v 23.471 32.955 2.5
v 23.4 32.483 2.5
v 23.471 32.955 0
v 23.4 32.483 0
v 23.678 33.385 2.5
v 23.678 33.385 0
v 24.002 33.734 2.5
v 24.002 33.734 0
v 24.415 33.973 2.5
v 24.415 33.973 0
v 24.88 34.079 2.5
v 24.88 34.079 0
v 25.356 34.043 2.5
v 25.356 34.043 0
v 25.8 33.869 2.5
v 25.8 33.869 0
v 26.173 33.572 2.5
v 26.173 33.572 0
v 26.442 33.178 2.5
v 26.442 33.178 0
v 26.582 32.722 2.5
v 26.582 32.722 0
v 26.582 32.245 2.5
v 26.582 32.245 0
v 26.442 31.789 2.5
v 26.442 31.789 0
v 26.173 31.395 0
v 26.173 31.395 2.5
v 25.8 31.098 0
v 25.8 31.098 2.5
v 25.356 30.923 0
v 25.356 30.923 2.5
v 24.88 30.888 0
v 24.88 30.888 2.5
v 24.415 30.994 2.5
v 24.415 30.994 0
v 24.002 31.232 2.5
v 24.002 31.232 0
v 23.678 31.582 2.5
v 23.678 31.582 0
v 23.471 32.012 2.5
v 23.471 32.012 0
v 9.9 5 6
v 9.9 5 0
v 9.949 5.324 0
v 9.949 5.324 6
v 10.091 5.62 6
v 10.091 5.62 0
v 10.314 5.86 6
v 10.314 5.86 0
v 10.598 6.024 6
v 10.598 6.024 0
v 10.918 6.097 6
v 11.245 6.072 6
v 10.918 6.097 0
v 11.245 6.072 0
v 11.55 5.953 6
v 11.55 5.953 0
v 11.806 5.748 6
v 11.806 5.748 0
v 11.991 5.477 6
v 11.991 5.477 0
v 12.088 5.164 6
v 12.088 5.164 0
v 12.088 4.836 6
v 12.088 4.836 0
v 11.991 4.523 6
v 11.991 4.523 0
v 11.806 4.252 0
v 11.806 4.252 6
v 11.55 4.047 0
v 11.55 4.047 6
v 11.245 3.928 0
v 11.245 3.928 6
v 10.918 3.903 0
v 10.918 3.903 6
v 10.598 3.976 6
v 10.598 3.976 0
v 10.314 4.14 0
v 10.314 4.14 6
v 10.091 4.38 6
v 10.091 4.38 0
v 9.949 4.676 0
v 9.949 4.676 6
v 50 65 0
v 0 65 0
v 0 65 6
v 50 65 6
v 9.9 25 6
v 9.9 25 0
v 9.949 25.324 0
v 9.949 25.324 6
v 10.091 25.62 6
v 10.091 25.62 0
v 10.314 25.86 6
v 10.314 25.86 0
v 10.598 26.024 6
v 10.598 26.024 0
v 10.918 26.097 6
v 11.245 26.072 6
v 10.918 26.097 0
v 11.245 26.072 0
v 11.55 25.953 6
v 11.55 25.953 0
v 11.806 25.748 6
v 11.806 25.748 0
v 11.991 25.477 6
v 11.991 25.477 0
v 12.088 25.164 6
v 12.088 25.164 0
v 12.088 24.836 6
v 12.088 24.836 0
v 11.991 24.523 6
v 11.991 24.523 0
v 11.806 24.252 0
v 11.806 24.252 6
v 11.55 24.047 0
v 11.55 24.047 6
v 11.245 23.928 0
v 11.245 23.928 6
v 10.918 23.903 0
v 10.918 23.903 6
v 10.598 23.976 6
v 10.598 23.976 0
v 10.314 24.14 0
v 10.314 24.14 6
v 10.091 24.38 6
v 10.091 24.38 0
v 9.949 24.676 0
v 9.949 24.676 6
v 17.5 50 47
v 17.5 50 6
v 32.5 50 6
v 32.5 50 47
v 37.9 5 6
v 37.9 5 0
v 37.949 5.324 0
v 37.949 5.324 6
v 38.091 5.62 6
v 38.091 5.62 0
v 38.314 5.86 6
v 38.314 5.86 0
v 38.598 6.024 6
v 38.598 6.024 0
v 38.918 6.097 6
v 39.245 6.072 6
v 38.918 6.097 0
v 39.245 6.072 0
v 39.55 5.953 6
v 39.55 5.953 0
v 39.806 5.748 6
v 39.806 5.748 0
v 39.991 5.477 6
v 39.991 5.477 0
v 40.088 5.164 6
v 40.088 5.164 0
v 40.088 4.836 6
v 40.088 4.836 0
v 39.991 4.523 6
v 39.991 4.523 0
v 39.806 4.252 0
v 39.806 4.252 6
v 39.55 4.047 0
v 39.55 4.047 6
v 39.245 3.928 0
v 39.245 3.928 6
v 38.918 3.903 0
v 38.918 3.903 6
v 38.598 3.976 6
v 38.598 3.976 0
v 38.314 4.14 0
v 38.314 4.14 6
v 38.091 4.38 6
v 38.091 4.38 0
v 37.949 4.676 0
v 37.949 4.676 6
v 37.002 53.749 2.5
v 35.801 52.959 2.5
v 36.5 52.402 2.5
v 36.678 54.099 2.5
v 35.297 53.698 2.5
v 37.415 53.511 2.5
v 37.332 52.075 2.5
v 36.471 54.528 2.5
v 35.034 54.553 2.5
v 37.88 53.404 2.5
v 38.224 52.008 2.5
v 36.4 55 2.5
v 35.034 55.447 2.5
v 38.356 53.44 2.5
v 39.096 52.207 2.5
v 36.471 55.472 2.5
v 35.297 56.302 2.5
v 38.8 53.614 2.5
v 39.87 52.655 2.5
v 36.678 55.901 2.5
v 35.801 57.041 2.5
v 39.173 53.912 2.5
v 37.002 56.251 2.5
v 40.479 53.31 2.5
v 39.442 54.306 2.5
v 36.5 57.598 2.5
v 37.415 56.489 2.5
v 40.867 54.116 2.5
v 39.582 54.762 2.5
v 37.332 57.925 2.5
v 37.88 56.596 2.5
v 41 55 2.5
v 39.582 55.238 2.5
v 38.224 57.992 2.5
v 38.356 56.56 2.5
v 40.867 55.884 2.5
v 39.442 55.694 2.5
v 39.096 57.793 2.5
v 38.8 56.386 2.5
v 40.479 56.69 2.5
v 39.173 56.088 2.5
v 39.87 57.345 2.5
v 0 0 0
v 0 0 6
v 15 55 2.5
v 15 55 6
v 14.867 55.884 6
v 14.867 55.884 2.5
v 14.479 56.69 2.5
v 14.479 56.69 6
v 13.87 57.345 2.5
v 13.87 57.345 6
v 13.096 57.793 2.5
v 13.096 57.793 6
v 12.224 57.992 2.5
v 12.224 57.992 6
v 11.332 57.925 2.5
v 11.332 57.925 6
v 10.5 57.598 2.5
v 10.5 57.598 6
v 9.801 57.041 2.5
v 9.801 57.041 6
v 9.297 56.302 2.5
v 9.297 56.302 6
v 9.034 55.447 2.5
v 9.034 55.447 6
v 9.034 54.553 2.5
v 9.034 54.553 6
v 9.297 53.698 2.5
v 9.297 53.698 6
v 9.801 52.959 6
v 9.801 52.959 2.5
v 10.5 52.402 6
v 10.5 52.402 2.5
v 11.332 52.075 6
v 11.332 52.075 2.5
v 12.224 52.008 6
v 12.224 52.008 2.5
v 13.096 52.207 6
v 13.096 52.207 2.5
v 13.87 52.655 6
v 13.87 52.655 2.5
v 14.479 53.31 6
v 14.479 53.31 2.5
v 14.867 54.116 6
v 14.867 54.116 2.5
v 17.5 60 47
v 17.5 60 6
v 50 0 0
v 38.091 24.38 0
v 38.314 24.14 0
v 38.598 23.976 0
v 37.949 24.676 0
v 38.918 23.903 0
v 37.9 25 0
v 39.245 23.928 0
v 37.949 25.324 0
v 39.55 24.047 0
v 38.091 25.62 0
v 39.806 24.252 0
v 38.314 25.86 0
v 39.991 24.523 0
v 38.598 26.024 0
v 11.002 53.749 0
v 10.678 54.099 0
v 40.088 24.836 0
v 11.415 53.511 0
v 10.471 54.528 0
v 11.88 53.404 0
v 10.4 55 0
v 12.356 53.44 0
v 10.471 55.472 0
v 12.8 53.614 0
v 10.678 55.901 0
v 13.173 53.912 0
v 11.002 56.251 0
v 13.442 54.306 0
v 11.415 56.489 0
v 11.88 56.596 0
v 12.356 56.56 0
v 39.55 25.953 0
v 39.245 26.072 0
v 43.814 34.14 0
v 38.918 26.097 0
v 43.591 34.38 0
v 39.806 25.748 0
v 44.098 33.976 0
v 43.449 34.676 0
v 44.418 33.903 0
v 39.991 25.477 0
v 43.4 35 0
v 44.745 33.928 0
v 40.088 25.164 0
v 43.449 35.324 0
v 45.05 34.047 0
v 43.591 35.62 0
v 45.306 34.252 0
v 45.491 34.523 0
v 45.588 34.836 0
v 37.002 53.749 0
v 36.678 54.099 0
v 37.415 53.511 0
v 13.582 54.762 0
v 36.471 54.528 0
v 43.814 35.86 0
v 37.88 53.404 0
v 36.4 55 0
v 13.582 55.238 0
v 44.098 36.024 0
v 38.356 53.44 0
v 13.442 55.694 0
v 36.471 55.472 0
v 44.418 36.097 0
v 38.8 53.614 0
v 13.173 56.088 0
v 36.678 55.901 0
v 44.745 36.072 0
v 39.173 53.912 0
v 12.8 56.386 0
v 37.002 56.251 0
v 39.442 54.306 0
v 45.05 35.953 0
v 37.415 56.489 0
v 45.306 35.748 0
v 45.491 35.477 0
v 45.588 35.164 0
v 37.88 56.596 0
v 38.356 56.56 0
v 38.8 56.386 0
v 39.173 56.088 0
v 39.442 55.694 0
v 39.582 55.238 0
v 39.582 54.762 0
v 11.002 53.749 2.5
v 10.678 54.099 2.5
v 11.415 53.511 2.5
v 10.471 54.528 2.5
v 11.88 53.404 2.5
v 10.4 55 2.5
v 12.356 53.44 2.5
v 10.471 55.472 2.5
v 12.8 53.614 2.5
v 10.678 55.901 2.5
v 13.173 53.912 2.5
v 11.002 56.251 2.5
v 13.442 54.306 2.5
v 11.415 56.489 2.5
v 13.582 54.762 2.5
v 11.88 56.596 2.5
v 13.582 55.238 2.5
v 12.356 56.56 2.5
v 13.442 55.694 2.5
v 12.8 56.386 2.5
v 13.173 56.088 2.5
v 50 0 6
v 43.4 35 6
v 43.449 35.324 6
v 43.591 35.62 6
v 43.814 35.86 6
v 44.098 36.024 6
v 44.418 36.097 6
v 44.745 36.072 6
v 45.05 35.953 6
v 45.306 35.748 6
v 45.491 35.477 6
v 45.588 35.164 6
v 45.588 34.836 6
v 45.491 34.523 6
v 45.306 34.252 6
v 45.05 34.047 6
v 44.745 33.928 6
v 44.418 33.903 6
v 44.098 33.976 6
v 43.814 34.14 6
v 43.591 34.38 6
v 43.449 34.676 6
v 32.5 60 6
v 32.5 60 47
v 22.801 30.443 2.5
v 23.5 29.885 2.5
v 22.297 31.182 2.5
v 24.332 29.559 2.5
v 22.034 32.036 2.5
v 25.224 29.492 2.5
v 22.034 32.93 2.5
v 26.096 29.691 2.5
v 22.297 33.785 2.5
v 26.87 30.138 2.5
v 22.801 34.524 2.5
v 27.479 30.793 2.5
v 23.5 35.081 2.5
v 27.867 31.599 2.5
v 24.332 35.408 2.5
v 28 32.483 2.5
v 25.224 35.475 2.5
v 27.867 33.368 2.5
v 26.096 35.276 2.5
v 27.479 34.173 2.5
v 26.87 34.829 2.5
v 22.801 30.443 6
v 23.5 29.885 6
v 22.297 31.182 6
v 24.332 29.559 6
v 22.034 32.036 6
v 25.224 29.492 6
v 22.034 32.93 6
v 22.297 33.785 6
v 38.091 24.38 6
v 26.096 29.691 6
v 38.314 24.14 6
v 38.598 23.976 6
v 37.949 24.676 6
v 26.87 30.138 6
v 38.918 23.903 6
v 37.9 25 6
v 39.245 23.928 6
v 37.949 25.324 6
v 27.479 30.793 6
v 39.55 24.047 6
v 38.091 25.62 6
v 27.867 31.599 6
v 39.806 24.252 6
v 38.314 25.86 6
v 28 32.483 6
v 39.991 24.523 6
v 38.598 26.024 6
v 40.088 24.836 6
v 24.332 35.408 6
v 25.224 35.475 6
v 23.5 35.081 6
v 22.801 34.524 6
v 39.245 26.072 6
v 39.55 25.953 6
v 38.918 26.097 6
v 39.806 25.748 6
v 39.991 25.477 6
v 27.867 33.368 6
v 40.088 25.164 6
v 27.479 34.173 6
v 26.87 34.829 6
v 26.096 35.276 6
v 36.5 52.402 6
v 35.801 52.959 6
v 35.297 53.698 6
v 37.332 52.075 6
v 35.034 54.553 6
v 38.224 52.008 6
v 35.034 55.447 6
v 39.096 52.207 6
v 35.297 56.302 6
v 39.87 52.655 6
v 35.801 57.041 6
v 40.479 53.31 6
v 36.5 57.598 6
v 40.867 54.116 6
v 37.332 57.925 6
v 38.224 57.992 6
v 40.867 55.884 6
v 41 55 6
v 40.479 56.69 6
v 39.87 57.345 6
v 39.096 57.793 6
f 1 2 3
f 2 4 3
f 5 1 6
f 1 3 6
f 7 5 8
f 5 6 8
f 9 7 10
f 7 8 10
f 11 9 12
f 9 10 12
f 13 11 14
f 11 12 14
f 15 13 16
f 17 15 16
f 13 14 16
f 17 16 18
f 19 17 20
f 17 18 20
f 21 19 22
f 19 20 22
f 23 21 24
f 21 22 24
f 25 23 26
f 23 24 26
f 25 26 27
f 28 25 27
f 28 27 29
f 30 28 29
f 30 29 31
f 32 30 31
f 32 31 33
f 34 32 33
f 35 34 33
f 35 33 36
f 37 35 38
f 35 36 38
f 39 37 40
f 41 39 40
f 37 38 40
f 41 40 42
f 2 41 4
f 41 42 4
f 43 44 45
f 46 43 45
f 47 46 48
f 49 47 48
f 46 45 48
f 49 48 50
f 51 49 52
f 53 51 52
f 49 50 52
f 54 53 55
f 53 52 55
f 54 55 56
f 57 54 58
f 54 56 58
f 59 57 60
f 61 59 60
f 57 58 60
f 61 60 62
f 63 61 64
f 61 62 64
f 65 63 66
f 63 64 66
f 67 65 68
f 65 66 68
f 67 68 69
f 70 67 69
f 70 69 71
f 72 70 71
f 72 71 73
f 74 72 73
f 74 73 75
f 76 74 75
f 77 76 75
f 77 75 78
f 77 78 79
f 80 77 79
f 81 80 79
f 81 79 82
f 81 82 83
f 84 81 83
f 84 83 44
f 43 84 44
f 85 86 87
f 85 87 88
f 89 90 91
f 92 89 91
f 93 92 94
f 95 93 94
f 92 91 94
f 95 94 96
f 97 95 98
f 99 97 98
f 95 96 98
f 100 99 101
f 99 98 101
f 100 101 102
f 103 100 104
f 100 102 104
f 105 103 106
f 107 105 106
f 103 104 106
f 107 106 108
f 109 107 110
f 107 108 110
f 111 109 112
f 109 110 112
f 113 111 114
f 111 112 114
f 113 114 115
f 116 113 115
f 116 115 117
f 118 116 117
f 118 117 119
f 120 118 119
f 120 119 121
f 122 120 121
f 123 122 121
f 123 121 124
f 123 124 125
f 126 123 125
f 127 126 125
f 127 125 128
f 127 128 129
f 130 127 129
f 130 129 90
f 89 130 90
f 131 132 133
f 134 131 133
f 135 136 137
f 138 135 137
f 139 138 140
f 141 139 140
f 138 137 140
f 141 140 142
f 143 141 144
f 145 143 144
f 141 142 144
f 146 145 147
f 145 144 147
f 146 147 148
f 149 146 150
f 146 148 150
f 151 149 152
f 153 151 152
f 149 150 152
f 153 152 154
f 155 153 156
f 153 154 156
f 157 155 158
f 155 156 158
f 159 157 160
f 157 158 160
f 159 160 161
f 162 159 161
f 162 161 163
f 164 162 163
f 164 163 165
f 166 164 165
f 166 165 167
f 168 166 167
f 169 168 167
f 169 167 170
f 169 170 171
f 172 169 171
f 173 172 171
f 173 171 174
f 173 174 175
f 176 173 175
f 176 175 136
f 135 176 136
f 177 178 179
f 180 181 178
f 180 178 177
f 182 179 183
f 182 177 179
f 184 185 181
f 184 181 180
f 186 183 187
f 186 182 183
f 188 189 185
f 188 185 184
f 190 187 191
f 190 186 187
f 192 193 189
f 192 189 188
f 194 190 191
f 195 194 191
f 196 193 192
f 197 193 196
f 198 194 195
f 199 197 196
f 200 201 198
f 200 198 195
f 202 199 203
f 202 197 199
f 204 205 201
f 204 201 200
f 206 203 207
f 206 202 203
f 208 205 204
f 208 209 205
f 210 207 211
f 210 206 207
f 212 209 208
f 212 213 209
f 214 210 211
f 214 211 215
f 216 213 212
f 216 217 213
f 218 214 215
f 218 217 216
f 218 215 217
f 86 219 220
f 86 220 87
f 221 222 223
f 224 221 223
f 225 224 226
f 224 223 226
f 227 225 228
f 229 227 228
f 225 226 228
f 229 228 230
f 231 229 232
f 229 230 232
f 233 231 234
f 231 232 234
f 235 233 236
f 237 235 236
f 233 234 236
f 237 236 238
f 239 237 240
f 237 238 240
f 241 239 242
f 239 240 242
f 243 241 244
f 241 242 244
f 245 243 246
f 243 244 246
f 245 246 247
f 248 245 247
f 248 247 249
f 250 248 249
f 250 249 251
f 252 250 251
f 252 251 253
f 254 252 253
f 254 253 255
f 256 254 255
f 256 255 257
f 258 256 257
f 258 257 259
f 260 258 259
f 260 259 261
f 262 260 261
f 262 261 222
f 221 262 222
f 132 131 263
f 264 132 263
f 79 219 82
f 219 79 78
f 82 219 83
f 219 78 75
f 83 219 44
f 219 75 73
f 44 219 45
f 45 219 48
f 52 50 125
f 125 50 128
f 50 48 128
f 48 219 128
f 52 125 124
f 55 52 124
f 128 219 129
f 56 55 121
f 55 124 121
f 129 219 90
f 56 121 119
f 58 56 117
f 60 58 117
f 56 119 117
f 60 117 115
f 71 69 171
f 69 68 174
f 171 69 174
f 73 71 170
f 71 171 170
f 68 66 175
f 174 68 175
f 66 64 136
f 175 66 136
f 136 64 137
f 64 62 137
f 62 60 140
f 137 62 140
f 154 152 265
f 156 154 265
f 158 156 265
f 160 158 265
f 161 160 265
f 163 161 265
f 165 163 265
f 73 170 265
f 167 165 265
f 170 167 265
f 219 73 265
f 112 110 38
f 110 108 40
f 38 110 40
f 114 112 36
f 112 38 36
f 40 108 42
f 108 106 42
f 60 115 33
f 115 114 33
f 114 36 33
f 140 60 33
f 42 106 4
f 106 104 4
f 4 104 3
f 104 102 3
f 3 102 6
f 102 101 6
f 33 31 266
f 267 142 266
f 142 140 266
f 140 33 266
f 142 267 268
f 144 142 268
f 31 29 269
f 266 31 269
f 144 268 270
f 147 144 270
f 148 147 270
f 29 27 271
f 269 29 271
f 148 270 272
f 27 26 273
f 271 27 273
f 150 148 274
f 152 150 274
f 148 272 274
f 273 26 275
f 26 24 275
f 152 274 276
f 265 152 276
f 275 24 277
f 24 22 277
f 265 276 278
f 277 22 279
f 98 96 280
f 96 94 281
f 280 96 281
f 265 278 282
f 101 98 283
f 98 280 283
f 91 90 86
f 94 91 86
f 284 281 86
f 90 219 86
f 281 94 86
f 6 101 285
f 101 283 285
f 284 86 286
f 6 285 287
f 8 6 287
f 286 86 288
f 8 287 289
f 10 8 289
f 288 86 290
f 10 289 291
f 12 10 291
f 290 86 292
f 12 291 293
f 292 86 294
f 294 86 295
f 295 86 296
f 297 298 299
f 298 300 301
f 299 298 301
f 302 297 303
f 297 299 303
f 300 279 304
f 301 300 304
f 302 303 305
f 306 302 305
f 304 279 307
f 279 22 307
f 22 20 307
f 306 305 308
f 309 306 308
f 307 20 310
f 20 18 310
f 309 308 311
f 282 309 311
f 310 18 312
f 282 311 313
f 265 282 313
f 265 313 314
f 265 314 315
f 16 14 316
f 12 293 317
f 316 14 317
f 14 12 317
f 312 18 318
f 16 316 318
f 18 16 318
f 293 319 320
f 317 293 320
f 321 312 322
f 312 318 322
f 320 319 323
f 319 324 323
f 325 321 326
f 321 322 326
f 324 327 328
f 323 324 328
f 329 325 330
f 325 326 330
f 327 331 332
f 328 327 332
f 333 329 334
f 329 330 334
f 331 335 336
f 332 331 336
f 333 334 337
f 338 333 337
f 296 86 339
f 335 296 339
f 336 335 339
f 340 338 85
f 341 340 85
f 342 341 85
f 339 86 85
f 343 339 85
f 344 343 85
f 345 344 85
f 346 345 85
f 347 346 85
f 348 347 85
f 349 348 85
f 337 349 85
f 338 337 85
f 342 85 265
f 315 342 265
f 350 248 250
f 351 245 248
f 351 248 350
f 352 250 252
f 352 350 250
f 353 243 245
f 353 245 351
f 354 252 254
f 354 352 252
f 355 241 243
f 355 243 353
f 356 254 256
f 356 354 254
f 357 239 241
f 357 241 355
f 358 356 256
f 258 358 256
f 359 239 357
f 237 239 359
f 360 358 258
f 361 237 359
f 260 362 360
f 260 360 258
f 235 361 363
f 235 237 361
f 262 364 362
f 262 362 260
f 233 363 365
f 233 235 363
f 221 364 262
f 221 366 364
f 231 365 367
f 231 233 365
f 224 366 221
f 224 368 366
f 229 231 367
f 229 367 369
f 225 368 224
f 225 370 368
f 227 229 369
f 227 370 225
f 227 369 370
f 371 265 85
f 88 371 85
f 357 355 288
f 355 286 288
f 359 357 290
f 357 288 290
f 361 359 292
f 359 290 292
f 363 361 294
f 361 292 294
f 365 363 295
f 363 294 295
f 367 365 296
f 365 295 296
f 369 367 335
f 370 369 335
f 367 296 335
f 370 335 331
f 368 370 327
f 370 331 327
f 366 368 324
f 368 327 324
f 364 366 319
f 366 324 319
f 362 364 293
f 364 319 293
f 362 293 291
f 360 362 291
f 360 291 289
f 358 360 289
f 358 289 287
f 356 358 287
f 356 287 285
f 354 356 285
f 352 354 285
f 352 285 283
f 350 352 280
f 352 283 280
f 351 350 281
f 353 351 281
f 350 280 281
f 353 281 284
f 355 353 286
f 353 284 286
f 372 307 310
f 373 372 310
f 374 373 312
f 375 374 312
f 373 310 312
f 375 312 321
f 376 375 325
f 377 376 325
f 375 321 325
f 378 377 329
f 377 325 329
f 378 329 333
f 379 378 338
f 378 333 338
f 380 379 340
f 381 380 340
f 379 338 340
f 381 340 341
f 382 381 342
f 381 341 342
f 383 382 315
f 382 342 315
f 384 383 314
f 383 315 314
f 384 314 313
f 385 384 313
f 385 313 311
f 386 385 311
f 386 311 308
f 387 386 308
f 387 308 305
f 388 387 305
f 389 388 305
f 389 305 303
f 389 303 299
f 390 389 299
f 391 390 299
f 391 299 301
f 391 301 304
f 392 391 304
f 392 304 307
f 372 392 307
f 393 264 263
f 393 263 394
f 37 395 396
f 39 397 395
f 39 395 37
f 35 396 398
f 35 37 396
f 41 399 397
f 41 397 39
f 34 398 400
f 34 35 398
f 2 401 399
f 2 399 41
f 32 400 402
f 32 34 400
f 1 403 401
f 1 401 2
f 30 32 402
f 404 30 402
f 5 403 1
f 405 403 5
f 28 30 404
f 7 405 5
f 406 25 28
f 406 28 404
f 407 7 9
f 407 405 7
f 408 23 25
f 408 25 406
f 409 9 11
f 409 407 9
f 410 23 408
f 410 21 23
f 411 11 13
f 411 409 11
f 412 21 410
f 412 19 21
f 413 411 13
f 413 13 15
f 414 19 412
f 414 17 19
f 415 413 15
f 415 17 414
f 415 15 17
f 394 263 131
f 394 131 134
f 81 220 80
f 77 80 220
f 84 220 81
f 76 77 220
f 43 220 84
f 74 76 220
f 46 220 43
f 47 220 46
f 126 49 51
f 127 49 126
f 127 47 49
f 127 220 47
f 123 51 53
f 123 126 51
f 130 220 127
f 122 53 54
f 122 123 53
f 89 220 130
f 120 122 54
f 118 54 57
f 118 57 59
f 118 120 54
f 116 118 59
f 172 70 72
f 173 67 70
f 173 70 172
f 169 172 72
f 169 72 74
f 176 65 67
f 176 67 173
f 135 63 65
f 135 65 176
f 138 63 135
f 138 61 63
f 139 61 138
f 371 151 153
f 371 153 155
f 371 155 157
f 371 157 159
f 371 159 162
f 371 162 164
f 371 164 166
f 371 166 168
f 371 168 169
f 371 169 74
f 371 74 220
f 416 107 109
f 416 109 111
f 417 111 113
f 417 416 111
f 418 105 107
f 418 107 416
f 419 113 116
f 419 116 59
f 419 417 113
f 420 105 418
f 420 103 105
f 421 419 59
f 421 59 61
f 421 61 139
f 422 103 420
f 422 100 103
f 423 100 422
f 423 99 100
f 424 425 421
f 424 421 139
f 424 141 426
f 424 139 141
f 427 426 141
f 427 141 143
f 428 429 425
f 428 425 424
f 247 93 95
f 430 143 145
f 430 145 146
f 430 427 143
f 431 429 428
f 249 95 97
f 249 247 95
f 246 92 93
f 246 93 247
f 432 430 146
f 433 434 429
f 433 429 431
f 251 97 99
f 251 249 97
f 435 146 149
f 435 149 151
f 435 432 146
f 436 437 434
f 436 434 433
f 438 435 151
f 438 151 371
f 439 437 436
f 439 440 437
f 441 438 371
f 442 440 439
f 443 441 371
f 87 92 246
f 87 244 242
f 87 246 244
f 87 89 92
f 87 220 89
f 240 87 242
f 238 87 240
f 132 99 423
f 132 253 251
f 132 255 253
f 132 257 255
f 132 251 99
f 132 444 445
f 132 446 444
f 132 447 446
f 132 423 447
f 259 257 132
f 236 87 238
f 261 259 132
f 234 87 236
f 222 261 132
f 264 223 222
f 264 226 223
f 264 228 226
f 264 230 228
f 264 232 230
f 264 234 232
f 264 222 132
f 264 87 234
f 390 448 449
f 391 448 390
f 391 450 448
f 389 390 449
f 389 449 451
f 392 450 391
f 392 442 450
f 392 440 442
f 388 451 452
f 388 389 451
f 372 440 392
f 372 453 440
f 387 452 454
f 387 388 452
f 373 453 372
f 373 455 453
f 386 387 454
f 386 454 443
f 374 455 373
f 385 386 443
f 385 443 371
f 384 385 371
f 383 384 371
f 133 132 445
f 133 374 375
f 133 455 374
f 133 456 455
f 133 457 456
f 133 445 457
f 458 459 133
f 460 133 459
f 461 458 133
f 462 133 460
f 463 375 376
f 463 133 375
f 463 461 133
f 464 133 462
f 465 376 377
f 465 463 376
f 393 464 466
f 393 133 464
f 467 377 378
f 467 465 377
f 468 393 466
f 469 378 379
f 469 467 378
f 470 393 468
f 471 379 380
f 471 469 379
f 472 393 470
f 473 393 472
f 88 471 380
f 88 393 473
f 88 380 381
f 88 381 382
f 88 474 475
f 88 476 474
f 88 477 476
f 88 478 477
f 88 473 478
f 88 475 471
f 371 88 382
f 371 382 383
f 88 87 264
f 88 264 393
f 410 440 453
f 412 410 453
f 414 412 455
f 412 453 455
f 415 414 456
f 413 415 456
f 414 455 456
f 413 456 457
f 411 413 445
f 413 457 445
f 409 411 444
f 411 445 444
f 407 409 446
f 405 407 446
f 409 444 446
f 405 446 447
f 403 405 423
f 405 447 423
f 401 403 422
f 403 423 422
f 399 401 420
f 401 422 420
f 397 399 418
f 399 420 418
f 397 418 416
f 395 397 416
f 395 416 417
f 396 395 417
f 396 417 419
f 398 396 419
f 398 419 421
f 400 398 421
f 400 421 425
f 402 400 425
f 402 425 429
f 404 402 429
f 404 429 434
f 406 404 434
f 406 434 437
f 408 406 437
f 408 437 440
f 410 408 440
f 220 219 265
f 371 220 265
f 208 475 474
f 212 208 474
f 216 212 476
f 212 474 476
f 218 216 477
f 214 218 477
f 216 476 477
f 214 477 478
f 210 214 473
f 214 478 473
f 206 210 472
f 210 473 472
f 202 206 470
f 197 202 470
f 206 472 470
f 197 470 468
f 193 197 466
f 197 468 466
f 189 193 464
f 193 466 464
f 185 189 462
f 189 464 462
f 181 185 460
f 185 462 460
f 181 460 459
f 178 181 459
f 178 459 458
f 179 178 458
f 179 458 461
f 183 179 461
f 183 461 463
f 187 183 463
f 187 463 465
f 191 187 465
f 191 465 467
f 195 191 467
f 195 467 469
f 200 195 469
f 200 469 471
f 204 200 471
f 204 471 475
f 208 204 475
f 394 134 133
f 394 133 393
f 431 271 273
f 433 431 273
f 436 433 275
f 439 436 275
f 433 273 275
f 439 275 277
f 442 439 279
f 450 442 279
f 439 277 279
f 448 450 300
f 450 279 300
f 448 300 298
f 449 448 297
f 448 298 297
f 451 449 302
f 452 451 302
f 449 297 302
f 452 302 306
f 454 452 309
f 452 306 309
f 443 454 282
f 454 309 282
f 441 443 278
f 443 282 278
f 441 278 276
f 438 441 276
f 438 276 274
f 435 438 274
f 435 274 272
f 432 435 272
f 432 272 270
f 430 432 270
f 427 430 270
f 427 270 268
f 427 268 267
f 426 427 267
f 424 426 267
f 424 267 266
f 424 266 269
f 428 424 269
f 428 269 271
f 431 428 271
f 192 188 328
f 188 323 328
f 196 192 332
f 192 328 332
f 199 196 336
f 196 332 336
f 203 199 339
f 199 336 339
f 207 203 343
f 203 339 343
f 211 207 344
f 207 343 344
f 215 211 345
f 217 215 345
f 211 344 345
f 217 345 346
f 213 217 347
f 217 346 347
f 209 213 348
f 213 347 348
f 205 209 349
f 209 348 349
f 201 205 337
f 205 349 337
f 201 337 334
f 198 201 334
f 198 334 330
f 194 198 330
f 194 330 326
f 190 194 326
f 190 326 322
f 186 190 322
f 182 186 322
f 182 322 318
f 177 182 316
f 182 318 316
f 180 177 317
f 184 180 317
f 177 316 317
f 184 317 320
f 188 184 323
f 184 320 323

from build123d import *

# Parameters (mm, degrees)
F0_W           = 50
F0_H           = 65
F1_DEPTH       = 6
F2_W           = 15
F2_H           = 10
F3_DEPTH       = 41
F5_D           = 3.2
F5_CBORE_D     = 6
F5_CBORE_DEPTH = 3.5
F7_D           = 2.2


with BuildPart() as f1:
    # F0 (on Top) → F1 (new body)
    with BuildSketch(Plane.XY):
        with Locations((25, 32.5)):
            Rectangle(F0_W, F0_H)
    extrude(amount=F1_DEPTH)

    # F2 (on face) → F3 (join)
    with BuildSketch(Plane.XY.offset(6)):
        with Locations((25, 55)):
            Rectangle(F2_W, F2_H)
    extrude(amount=F3_DEPTH)

    # F5 (through all)
    with Locations(Plane.XY.offset(6)):
        with Locations((12, 55), (38, 55), (25, 32.48334)):
            CounterBoreHole(F5_D / 2, F5_CBORE_D / 2, F5_CBORE_DEPTH)

    # F7 (through all)
    with Locations(Plane.XY.offset(6)):
        with Locations((11, 25), (39, 25), (39, 5), (11, 5), (44.5, 35)):
            Hole(F7_D / 2)


solid = f1.part
